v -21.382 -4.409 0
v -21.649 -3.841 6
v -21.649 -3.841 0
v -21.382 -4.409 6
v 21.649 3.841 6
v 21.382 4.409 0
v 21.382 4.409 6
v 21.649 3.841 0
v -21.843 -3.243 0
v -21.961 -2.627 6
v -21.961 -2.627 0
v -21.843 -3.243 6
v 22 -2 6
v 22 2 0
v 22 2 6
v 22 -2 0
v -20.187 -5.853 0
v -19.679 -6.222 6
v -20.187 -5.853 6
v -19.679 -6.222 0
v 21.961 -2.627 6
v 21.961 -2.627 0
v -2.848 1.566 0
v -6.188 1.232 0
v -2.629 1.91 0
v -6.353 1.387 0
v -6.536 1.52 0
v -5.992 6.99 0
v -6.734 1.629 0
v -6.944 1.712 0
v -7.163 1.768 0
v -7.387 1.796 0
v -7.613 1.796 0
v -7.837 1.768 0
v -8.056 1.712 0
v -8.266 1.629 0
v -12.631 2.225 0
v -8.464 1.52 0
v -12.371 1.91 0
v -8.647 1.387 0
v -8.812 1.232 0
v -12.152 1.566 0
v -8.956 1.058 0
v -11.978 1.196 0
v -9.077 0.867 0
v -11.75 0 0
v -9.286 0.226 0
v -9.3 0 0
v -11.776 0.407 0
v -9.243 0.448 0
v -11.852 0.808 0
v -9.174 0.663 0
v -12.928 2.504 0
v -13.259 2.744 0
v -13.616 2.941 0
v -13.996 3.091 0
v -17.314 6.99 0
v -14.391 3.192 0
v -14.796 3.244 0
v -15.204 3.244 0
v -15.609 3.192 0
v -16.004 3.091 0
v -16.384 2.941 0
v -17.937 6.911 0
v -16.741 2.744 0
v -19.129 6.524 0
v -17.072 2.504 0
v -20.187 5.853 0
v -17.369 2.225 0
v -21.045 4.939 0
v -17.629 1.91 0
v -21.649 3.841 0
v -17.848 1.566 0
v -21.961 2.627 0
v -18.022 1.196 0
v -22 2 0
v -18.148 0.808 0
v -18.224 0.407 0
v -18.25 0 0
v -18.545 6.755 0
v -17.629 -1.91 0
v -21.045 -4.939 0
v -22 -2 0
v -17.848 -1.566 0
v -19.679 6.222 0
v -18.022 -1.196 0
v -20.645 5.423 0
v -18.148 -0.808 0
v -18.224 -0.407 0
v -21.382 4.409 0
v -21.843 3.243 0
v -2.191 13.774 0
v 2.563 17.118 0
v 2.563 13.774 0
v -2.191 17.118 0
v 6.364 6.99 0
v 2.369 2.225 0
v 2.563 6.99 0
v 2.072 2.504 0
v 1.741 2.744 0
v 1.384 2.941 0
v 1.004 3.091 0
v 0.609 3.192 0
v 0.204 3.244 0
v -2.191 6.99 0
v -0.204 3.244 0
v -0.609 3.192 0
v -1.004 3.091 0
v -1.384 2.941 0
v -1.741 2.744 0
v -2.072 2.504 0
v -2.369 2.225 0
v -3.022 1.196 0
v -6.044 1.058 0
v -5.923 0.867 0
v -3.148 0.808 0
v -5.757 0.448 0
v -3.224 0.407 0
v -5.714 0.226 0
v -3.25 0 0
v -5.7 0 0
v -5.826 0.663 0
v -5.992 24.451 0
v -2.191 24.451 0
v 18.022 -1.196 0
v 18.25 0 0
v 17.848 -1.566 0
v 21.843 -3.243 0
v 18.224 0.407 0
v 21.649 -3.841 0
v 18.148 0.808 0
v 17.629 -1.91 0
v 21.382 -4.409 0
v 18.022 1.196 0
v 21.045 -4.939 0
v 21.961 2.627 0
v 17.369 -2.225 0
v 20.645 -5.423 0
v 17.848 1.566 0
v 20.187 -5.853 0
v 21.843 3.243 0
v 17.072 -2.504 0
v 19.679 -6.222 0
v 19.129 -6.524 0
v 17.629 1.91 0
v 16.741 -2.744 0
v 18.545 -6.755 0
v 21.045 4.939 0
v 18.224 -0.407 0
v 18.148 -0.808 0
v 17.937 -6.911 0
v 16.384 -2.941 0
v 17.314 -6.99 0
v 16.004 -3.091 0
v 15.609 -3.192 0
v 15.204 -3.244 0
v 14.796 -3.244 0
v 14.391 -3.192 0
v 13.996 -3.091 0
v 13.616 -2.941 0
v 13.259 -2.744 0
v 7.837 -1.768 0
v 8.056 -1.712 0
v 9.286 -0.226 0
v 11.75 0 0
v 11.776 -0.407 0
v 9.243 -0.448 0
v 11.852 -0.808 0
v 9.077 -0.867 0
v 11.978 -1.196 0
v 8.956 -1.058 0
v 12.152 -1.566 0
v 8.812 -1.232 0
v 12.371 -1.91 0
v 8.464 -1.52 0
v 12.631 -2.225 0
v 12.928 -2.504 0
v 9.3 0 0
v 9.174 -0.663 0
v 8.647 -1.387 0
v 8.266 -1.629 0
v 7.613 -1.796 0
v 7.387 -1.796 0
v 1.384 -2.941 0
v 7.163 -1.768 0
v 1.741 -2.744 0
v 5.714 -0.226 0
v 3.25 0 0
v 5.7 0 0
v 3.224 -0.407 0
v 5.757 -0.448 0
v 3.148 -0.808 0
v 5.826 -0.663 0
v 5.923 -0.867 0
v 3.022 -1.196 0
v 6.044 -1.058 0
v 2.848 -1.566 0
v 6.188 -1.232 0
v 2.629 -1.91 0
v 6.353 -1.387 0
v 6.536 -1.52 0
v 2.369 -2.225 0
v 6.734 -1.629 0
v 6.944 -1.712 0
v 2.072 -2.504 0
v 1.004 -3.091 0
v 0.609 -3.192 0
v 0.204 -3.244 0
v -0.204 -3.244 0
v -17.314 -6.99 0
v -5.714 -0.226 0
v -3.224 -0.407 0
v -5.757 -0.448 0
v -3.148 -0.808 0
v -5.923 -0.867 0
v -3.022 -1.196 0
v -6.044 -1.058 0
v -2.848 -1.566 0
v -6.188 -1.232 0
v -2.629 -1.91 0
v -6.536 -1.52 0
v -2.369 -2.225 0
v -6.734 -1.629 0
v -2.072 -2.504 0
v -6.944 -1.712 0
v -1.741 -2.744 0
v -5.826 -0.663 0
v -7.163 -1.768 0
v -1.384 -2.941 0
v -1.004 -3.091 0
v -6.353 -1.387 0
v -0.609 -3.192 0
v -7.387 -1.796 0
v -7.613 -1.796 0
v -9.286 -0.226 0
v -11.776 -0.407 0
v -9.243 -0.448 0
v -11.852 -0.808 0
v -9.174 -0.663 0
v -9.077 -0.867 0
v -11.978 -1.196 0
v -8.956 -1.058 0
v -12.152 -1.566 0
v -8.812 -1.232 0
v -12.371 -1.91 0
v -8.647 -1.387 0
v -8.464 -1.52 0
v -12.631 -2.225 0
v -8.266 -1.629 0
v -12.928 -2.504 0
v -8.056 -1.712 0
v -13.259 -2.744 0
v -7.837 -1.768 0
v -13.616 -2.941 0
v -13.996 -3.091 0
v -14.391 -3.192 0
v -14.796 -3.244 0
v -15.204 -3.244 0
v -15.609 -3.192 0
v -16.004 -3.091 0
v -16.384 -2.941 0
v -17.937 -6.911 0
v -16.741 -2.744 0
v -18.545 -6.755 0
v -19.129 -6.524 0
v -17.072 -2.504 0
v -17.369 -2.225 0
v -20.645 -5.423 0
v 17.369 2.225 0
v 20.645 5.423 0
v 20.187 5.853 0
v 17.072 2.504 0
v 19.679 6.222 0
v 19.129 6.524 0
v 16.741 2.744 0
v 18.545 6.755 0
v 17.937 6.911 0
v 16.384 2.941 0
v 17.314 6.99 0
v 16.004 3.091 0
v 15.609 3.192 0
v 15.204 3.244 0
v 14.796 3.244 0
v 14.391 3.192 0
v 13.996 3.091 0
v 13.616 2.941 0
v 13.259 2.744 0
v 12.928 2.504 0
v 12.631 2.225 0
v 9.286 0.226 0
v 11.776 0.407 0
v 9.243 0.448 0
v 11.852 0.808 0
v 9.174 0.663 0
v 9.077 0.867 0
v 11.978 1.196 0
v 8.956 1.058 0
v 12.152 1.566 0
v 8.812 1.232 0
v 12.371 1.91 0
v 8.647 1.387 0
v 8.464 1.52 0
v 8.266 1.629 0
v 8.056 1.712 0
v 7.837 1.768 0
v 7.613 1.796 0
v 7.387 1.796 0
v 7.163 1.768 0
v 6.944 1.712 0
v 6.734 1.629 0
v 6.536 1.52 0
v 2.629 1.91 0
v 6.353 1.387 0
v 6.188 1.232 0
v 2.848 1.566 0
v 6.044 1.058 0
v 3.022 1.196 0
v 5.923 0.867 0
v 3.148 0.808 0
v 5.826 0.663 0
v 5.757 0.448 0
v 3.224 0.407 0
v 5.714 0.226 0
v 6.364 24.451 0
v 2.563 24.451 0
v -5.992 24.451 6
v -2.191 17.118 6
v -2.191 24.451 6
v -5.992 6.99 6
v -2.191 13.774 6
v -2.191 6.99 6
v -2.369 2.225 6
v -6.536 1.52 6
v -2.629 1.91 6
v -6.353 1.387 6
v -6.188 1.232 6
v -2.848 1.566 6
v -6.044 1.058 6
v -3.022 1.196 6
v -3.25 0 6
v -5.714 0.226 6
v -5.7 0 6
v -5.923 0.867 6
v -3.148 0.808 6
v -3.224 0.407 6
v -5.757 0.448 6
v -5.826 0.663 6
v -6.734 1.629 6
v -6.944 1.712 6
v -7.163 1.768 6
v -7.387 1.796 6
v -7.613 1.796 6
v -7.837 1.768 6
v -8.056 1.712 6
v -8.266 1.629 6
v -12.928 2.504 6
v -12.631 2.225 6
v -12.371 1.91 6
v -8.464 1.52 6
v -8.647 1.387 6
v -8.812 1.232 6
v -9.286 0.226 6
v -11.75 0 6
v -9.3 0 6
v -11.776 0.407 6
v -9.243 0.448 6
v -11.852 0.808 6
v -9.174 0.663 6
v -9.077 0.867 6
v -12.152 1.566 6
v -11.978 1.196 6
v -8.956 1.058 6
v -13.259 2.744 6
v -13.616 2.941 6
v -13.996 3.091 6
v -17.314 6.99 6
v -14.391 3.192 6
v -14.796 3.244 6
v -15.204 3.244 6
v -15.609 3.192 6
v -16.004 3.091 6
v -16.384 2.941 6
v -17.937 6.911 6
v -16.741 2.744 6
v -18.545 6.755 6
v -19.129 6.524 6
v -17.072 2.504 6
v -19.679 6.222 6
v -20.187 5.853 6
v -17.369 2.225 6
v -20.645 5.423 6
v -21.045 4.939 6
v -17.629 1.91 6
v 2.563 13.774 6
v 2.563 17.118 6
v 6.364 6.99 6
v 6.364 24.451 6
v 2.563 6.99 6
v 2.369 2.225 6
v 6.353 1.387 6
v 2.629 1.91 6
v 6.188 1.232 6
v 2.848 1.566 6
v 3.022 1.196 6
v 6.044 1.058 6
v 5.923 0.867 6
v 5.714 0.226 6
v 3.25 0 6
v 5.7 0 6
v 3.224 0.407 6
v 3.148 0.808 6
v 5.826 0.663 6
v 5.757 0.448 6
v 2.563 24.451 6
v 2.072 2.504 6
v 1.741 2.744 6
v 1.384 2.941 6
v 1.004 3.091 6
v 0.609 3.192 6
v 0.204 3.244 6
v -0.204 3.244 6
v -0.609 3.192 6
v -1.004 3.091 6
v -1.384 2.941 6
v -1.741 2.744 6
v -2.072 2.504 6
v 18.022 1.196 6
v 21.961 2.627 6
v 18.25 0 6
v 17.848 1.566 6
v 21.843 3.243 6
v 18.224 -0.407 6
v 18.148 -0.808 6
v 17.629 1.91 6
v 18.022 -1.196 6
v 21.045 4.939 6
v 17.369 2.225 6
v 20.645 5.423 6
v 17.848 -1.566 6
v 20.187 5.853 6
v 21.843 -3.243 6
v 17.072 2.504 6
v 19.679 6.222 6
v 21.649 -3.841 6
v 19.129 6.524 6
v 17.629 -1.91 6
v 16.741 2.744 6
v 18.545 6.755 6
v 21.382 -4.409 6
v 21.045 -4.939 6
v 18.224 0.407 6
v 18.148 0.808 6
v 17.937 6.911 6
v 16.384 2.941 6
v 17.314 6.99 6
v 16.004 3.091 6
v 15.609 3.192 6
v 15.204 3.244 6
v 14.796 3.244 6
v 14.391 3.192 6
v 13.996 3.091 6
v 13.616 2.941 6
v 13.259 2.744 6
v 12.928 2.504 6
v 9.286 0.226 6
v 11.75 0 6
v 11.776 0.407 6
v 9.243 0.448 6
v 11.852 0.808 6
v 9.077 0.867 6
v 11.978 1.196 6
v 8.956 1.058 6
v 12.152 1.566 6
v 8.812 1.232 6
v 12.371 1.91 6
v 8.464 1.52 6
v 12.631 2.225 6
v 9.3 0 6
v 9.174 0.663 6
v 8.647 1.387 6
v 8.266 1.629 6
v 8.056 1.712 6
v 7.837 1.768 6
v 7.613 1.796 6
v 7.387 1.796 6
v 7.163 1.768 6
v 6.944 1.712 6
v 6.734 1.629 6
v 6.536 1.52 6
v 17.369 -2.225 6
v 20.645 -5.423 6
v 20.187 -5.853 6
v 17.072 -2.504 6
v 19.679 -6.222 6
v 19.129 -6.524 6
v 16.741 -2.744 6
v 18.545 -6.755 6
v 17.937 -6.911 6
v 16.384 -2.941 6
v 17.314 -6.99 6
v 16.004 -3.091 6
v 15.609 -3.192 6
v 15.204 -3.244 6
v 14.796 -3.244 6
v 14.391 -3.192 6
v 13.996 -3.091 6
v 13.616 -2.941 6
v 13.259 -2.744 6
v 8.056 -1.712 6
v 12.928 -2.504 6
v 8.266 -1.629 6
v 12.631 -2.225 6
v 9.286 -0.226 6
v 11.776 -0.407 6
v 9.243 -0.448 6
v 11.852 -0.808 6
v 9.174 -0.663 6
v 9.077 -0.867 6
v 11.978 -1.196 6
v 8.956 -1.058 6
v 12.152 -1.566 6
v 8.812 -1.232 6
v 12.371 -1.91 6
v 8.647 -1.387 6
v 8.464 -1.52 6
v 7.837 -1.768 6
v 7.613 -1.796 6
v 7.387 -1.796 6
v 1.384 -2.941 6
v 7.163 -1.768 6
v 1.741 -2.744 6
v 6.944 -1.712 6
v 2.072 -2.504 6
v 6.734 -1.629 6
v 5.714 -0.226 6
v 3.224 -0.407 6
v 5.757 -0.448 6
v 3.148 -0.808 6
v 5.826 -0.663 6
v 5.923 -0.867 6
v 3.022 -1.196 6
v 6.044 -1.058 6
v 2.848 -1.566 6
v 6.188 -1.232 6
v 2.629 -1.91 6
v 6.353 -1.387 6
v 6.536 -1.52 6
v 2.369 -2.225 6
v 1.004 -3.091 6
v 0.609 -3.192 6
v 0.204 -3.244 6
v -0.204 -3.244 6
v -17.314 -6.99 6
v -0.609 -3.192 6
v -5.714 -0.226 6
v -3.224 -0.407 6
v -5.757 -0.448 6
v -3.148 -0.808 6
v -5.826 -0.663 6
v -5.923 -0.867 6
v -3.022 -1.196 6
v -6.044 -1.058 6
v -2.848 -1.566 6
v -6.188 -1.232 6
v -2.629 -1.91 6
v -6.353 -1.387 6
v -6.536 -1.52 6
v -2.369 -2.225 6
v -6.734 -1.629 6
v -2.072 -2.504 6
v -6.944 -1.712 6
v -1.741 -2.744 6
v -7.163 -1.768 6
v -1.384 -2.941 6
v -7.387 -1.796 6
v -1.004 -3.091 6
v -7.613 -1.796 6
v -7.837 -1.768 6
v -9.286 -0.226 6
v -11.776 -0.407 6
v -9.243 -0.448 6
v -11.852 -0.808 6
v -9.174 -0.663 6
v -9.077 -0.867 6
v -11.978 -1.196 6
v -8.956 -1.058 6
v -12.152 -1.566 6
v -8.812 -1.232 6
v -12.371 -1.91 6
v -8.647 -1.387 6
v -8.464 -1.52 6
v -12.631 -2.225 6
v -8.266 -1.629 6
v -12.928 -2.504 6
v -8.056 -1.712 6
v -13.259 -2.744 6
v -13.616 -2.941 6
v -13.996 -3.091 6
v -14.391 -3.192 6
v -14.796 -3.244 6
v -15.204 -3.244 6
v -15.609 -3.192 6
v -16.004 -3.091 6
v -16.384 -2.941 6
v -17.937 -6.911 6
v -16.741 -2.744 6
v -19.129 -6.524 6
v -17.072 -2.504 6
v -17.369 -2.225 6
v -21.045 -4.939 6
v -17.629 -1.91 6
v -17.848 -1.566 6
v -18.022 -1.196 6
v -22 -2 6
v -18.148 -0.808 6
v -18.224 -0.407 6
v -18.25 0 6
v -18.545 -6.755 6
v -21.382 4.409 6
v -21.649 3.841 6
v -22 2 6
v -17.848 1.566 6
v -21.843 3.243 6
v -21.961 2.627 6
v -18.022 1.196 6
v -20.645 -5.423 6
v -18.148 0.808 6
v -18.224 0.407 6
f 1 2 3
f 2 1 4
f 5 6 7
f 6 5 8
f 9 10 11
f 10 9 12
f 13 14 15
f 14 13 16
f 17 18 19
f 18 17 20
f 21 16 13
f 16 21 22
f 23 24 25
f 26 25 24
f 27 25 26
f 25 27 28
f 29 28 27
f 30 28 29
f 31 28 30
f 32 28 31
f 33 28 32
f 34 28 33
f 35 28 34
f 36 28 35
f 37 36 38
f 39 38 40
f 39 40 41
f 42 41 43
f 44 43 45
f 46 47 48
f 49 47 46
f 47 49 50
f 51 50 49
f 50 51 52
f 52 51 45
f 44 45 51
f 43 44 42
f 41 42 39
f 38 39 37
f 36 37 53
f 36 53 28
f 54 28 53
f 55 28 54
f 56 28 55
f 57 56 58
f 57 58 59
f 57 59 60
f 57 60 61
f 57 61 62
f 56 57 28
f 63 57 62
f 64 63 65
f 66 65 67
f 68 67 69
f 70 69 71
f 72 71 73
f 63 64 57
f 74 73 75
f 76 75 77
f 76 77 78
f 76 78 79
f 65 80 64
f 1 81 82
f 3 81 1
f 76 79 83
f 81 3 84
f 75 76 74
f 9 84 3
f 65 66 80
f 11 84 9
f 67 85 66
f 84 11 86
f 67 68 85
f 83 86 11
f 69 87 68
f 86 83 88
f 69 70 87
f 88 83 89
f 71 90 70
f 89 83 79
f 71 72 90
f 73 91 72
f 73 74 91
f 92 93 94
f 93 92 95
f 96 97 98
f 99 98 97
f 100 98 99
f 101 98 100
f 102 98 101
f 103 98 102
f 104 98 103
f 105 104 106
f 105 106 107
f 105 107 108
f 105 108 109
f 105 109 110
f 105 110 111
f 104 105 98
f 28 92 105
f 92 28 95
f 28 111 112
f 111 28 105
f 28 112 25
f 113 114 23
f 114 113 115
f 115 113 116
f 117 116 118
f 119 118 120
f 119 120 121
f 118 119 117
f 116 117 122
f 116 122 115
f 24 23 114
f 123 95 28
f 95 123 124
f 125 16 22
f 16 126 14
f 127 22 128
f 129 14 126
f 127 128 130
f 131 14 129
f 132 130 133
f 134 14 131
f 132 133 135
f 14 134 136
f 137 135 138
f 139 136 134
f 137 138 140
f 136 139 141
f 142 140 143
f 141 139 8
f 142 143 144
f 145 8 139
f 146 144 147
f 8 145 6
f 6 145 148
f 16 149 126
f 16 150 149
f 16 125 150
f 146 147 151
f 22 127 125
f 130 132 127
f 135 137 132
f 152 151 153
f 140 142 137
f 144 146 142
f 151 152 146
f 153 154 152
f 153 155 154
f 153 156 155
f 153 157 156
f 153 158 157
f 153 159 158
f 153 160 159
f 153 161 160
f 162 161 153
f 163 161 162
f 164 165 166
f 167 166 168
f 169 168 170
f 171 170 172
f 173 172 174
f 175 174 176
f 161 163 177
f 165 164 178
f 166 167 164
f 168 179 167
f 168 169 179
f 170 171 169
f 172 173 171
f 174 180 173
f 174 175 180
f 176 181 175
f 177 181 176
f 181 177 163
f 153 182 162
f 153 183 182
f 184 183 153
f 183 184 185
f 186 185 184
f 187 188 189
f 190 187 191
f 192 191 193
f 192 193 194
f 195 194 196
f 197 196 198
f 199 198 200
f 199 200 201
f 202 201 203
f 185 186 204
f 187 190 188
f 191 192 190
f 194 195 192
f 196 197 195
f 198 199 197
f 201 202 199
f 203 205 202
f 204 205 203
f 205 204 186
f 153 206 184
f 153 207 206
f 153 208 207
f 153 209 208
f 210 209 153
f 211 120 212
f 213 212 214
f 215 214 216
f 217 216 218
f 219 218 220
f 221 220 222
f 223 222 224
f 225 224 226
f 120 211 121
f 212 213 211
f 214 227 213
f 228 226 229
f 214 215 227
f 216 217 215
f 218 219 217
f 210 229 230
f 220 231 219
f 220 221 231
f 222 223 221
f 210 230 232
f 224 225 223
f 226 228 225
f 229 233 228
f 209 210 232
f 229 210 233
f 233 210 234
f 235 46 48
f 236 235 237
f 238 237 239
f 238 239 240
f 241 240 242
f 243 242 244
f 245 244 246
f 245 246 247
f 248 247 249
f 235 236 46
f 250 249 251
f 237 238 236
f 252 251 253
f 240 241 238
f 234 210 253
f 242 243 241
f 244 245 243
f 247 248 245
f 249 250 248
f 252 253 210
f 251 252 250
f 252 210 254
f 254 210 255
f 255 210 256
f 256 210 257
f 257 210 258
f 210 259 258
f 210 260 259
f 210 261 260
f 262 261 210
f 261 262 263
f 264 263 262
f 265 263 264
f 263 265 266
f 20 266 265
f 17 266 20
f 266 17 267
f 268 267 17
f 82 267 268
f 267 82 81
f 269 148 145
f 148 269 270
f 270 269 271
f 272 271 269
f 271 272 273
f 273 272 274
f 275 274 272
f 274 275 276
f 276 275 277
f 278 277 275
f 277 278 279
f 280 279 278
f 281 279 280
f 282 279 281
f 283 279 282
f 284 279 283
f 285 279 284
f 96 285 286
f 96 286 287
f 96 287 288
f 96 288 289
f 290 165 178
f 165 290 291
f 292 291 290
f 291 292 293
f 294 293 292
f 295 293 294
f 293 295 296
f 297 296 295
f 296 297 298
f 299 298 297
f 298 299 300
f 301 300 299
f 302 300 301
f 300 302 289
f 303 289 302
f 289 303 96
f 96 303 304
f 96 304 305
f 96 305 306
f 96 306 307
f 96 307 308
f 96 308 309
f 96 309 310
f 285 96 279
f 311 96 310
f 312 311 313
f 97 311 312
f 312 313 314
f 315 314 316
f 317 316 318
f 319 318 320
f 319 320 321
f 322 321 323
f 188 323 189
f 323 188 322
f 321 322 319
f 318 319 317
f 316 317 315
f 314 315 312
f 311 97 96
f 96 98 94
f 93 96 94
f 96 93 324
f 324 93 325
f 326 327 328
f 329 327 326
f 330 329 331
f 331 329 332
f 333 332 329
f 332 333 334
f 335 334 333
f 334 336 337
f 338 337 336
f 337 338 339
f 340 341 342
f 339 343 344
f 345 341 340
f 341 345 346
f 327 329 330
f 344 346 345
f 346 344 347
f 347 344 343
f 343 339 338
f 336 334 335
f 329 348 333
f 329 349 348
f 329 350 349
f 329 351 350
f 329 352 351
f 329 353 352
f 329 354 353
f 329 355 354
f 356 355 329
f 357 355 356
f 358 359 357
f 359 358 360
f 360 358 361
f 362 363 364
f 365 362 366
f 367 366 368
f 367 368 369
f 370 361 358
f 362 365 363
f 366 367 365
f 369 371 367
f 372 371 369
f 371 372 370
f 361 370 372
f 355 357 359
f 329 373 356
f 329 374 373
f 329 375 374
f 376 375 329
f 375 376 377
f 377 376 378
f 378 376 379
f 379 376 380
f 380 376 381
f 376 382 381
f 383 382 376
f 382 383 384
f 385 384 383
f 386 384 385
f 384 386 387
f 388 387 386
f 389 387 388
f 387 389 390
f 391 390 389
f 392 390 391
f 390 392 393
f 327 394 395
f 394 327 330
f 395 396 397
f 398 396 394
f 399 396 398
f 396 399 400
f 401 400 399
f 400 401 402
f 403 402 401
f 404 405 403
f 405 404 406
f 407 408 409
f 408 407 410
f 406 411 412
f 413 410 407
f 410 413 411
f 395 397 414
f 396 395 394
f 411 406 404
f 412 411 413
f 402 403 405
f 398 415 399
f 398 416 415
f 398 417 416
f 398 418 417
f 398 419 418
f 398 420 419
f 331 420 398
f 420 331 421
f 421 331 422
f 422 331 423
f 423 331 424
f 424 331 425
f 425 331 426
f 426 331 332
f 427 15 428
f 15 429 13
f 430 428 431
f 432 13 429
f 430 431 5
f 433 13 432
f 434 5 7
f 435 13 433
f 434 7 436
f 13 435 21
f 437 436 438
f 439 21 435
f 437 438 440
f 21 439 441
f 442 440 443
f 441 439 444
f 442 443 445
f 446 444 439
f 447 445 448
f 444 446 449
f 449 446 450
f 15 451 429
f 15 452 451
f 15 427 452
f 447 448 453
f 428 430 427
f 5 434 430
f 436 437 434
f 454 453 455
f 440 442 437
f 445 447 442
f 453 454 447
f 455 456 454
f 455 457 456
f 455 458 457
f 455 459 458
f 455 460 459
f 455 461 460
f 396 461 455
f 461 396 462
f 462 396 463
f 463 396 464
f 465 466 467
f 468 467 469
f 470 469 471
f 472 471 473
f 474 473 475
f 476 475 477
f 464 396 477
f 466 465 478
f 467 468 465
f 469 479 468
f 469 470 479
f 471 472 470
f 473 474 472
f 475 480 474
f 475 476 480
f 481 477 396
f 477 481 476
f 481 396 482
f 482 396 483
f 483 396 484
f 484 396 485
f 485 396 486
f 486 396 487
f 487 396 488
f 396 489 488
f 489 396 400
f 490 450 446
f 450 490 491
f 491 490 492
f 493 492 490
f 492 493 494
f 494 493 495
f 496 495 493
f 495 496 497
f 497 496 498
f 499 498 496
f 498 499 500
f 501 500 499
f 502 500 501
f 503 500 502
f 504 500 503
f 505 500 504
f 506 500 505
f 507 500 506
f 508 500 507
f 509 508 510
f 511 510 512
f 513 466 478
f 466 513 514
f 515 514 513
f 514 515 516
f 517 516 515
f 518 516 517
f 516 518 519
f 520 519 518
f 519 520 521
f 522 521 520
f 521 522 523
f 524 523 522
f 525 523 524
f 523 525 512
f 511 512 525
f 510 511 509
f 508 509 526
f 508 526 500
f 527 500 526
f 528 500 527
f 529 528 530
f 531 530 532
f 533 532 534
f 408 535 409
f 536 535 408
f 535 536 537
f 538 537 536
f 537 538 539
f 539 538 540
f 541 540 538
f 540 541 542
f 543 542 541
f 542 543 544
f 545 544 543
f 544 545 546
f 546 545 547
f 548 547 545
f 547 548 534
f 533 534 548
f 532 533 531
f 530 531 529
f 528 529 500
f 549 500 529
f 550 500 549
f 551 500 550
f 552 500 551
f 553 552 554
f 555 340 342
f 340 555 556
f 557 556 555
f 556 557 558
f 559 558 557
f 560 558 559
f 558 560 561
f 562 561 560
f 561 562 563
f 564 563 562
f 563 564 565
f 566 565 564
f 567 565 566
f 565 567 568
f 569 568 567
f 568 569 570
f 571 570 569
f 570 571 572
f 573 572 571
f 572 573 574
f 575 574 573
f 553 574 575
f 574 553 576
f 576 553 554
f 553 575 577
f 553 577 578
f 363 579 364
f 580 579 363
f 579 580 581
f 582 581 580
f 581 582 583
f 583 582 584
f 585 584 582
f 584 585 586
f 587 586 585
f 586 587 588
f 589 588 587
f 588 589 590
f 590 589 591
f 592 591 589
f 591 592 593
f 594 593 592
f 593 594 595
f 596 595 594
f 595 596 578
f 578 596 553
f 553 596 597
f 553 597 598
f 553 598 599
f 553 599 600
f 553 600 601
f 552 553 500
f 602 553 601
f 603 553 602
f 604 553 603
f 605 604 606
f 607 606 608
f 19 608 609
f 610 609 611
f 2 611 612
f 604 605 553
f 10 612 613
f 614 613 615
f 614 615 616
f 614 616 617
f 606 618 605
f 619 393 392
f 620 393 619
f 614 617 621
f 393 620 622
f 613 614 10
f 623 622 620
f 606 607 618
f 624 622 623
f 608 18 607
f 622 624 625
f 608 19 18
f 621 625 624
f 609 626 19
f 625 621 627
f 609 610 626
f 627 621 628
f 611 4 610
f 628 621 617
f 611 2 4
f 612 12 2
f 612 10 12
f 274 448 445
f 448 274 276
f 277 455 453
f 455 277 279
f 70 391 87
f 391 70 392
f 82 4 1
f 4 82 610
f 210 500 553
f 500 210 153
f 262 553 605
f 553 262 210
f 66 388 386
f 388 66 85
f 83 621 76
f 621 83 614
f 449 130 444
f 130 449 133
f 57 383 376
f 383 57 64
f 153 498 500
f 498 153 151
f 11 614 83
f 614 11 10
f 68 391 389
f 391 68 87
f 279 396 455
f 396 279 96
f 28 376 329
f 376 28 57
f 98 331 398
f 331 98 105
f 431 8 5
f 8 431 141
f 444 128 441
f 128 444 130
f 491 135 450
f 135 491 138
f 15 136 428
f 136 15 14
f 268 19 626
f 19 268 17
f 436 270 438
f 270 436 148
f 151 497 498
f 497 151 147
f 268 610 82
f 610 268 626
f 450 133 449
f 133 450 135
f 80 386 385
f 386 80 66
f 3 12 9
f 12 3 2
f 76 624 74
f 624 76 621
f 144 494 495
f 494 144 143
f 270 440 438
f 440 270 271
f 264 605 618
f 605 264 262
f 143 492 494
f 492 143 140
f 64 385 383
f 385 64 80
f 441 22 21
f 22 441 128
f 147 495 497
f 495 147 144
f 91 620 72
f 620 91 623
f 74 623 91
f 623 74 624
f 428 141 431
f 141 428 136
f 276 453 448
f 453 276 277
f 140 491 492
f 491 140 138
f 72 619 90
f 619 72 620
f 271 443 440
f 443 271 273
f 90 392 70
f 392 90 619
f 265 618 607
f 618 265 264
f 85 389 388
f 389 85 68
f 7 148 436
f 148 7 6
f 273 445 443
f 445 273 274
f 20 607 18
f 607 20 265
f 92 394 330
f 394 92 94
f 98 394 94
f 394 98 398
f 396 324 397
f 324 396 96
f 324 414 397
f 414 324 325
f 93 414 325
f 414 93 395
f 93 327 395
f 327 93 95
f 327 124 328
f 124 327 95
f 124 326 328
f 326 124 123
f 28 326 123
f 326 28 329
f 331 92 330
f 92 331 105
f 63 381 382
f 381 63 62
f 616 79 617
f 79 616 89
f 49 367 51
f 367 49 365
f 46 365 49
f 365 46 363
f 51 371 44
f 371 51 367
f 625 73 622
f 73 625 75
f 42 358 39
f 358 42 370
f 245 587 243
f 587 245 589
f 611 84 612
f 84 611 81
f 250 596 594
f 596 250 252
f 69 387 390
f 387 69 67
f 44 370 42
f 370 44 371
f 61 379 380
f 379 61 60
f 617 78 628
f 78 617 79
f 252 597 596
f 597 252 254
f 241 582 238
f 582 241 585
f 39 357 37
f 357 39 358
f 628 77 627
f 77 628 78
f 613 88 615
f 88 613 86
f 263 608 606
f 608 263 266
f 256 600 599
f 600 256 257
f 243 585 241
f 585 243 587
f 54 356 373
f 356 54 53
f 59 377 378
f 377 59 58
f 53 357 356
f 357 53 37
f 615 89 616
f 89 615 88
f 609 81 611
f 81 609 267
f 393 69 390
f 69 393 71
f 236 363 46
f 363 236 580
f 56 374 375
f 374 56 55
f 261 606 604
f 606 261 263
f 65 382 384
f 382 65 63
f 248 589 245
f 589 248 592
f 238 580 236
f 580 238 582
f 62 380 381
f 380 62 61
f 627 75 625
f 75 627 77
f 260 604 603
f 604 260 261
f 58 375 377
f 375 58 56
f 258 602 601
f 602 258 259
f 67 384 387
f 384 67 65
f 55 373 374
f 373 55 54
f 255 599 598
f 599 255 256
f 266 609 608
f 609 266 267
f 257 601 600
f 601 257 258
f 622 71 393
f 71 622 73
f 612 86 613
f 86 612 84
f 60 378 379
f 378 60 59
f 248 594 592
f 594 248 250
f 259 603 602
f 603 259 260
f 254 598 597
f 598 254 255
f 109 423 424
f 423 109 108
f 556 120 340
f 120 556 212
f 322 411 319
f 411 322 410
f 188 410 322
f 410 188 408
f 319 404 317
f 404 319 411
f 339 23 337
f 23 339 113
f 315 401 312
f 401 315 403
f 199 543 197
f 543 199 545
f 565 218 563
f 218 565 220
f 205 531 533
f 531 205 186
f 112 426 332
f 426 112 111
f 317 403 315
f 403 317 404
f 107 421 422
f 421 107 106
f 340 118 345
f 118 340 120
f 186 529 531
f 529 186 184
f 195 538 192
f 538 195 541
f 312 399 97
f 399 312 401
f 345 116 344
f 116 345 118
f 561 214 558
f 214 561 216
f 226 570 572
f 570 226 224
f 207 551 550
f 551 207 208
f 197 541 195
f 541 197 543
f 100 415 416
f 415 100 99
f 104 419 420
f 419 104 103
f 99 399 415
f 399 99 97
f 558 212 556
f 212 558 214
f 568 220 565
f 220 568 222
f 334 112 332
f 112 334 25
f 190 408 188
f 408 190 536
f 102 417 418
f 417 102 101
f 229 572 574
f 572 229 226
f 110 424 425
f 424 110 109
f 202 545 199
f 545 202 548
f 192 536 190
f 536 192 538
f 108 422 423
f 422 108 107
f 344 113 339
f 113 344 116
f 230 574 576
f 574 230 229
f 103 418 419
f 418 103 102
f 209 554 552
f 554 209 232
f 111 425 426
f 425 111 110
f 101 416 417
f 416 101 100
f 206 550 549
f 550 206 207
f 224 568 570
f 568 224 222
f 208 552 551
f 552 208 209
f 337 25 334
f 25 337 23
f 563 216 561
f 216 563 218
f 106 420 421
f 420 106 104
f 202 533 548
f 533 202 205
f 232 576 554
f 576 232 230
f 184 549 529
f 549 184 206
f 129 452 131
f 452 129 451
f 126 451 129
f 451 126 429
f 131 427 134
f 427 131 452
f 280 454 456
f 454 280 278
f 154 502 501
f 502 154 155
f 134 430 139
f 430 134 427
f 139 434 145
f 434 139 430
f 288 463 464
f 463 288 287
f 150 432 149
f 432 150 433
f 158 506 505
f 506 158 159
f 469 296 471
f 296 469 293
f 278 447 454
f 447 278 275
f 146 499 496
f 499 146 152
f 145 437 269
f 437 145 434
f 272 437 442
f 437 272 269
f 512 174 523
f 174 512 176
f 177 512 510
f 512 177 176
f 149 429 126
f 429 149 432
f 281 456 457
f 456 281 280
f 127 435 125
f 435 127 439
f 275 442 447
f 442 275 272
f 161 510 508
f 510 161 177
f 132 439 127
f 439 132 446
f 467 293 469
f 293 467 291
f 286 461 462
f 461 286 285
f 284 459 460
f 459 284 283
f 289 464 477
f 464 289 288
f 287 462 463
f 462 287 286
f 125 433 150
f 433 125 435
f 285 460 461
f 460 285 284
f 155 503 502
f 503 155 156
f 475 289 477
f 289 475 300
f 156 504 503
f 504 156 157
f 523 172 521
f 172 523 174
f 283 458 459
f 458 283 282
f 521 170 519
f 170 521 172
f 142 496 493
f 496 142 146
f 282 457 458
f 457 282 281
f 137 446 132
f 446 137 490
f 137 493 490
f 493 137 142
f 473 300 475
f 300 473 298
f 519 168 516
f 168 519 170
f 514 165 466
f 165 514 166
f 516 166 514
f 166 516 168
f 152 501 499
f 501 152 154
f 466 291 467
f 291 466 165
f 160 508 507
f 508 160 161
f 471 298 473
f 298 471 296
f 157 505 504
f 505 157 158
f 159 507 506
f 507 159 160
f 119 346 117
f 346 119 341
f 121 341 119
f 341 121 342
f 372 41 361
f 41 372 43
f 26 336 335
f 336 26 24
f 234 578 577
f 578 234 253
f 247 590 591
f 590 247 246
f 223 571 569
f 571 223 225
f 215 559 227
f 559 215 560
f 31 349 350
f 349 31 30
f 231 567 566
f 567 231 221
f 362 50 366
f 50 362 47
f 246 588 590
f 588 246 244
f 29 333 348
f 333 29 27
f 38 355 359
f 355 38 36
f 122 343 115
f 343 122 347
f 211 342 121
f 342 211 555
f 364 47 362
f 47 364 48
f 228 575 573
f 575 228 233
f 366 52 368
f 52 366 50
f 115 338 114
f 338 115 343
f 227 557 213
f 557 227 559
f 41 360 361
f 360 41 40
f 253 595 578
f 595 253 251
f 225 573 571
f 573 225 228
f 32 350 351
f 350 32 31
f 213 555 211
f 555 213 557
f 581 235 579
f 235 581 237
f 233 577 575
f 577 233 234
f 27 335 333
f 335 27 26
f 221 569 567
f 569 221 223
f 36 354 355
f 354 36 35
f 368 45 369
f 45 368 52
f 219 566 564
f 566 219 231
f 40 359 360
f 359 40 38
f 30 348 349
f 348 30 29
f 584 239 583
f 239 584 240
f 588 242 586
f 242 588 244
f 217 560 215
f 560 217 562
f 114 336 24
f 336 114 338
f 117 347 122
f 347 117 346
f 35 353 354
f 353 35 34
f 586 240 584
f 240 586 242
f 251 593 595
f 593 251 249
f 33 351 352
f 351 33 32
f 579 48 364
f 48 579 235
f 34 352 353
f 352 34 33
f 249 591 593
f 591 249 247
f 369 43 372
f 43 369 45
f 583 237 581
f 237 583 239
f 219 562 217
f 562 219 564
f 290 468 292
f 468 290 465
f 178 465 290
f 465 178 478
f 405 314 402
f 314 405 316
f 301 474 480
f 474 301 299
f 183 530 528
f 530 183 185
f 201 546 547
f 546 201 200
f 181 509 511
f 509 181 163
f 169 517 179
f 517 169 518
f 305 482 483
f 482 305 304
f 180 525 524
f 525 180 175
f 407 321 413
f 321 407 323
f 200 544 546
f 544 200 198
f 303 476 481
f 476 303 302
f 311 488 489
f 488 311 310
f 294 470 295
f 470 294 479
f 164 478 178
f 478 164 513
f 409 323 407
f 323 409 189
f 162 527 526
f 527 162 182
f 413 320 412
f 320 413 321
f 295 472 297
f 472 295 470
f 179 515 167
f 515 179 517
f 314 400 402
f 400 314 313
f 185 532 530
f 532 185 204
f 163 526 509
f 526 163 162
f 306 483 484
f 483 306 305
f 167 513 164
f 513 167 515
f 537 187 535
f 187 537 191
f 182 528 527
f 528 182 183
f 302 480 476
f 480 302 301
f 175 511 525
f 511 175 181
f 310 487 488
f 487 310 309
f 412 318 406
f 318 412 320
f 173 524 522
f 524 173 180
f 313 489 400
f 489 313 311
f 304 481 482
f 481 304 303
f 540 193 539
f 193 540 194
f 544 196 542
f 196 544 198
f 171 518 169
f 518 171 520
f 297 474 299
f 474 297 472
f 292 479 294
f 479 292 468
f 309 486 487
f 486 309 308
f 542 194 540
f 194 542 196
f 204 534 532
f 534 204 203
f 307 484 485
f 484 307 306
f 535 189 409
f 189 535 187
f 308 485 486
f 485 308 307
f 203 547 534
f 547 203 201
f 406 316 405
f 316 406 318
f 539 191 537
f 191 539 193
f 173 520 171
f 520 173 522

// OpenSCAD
$fn = 50;


difference() {
	union() {
		hull() {
			translate(v = [-17.0000000000, 2.0000000000, 0]) {
				cylinder(h = 6, r = 5);
			}
			translate(v = [17.0000000000, 2.0000000000, 0]) {
				cylinder(h = 6, r = 5);
			}
			translate(v = [-17.0000000000, -2.0000000000, 0]) {
				cylinder(h = 6, r = 5);
			}
			translate(v = [17.0000000000, -2.0000000000, 0]) {
				cylinder(h = 6, r = 5);
			}
		}
		translate(v = [0, 24, 0]) {
			linear_extrude(height = 6) {
				text(font = "DejaVu Sans Mono:style=Bold", halign = "center", size = 19.0000000000, text = "H", valign = "top");
			}
		}
	}
	union() {
		translate(v = [-15.0000000000, 0.0000000000, 0]) {
			translate(v = [0, 0, -100]) {
				cylinder(h = 200, r = 3.2500000000);
			}
		}
		translate(v = [0, 0, -100]) {
			cylinder(h = 200, r = 3.2500000000);
		}
		translate(v = [15.0000000000, 0.0000000000, 0]) {
			translate(v = [0, 0, -100]) {
				cylinder(h = 200, r = 3.2500000000);
			}
		}
		translate(v = [-15.0000000000, 0.0000000000, 0]) {
			translate(v = [0, 0, -100]) {
				cylinder(h = 200, r = 1.8000000000);
			}
		}
		translate(v = [-7.5000000000, 0.0000000000, 0]) {
			translate(v = [0, 0, -100]) {
				cylinder(h = 200, r = 1.8000000000);
			}
		}
		translate(v = [0, 0, -100]) {
			cylinder(h = 200, r = 1.8000000000);
		}
		translate(v = [7.5000000000, 0.0000000000, 0]) {
			translate(v = [0, 0, -100]) {
				cylinder(h = 200, r = 1.8000000000);
			}
		}
		translate(v = [15.0000000000, 0.0000000000, 0]) {
			translate(v = [0, 0, -100]) {
				cylinder(h = 200, r = 1.8000000000);
			}
		}
	}
}
